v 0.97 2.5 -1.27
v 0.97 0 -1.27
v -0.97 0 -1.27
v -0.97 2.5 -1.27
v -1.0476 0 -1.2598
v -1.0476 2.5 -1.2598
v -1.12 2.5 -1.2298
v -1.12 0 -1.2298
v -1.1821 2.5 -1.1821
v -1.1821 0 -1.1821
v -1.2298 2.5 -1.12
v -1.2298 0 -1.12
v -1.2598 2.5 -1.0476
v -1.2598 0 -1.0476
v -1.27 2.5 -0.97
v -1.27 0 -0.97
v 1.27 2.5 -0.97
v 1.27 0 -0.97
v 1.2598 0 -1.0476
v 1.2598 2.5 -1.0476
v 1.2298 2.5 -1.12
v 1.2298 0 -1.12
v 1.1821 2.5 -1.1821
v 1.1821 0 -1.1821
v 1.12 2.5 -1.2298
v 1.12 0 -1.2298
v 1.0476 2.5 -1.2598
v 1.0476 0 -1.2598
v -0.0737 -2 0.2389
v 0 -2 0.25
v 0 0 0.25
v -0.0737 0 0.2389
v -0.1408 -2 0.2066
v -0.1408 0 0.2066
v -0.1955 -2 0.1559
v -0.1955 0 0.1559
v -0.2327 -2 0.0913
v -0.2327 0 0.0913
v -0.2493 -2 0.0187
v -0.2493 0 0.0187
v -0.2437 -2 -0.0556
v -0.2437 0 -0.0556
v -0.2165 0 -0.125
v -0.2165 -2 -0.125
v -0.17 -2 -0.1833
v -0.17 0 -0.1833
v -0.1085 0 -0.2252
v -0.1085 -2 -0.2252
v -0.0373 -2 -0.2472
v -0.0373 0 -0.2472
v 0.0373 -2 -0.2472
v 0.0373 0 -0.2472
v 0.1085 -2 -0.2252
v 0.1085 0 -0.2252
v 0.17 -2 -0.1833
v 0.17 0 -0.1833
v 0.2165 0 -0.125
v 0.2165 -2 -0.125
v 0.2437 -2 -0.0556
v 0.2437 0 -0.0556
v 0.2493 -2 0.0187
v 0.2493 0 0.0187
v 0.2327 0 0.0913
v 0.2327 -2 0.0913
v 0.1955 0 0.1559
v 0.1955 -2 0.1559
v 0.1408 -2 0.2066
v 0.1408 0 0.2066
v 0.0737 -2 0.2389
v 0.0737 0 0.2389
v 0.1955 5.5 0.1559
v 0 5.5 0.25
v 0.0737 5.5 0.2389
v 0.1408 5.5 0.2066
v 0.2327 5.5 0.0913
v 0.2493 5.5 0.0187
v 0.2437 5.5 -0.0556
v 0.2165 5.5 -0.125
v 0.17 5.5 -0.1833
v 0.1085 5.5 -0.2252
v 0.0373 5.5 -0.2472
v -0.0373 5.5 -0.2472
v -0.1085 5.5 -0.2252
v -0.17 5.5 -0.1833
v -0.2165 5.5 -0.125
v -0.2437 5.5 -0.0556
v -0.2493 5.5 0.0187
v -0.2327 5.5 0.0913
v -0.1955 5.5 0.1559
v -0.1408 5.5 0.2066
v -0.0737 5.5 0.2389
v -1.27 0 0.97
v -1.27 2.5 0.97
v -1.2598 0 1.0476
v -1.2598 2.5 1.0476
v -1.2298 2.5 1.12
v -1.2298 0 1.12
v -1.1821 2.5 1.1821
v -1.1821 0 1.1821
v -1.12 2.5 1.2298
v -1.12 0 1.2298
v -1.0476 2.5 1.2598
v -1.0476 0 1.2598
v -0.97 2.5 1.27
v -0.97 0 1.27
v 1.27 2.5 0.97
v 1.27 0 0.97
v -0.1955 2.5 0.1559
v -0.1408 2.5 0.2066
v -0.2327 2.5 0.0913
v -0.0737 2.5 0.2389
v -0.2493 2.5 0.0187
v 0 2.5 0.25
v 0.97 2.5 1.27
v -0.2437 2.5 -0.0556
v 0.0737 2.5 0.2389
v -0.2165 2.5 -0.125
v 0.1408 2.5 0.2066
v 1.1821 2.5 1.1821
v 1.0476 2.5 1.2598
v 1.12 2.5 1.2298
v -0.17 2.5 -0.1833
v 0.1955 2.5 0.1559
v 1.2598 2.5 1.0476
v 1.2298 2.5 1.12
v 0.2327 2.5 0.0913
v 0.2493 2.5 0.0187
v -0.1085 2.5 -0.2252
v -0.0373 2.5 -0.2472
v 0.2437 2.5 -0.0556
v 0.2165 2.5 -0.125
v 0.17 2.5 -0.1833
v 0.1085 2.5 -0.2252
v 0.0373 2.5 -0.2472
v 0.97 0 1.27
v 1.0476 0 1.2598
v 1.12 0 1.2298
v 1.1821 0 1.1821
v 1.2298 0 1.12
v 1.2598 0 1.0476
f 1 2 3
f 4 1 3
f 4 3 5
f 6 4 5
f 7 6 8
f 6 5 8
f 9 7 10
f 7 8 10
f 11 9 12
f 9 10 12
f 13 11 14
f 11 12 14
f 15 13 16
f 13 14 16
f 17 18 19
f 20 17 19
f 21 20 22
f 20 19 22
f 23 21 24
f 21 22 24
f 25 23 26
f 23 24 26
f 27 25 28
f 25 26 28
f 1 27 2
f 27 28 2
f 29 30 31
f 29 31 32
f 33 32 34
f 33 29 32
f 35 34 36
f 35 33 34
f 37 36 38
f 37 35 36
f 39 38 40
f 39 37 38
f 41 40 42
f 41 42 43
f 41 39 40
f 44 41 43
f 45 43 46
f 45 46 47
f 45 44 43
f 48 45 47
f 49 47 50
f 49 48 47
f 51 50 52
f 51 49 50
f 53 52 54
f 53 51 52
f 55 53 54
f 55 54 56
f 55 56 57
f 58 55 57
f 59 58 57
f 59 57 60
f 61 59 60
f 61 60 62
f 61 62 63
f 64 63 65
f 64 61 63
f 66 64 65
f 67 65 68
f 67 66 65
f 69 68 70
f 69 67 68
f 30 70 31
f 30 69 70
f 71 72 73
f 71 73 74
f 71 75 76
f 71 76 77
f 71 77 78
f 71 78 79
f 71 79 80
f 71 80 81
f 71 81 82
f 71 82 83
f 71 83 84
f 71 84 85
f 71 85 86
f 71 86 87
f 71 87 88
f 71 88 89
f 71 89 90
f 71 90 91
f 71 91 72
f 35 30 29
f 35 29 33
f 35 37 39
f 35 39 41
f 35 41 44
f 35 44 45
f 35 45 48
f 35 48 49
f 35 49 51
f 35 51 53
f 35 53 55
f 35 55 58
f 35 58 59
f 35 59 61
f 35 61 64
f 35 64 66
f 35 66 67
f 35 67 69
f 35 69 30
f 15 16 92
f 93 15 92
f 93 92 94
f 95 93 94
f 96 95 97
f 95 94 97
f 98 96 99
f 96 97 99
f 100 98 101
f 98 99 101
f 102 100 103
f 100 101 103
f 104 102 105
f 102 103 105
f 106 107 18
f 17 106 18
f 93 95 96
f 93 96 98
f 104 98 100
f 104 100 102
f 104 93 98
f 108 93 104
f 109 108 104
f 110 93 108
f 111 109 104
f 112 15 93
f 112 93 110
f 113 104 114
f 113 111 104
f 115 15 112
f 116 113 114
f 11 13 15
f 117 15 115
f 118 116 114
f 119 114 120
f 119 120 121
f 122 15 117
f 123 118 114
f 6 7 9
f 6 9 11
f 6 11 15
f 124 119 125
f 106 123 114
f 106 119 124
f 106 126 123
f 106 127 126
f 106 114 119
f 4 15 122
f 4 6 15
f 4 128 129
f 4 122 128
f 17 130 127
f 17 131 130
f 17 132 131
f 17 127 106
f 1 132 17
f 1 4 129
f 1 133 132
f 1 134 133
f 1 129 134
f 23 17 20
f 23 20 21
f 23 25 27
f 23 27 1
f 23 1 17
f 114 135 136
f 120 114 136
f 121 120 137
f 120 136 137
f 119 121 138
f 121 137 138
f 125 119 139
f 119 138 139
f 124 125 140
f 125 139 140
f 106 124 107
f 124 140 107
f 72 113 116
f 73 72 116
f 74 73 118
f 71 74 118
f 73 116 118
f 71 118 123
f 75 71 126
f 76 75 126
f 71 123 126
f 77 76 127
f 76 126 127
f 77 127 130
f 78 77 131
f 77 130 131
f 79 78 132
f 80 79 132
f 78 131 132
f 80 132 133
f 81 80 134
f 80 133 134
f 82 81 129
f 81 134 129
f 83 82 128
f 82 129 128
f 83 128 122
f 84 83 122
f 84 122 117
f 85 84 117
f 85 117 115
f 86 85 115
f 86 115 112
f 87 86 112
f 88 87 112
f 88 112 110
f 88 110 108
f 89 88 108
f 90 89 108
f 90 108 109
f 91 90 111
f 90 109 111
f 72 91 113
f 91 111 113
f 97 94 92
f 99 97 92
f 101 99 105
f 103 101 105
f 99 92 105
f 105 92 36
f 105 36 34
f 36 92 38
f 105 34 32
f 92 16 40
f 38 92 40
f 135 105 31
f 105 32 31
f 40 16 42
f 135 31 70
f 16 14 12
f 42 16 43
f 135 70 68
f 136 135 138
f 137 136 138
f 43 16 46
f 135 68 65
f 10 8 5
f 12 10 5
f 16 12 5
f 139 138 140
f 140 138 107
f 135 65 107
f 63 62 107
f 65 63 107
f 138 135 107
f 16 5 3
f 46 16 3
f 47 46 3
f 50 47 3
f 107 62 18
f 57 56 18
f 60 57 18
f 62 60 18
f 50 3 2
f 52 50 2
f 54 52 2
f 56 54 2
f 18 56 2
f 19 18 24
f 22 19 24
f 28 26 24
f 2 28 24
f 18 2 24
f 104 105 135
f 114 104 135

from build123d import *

# Parameters (mm, degrees)
BOSS_EXTRUDE1_DEPTH = 2.5
SKETCH2_R           = 0.25
BOSS_EXTRUDE2_DEPTH = 3
BOSS_EXTRUDE3_START = 2
SKETCH3_R           = 0.25
BOSS_EXTRUDE3_DEPTH = 2


with BuildPart() as part:
    # Sketch1 → Boss-Extrude1 (new body)
    with BuildSketch(Plane(origin=(0, 0, 0), x_dir=(1, 0, 0), z_dir=(0, 1, 0))):
        with BuildLine():
            Line((-0.97, -1.27), (0.97, -1.27))
            ThreePointArc((0.97, -1.27), (1.182132034, -1.182132034), (1.27, -0.97))
            Line((1.27, -0.97), (1.27, 0.97))
            ThreePointArc((1.27, 0.97), (1.182132034, 1.182132034), (0.97, 1.27))
            Line((0.97, 1.27), (-0.97, 1.27))
            ThreePointArc((-0.97, 1.27), (-1.182132034, 1.182132034), (-1.27, 0.97))
            Line((-1.27, 0.97), (-1.27, -0.97))
            ThreePointArc((-1.27, -0.97), (-1.182132034, -1.182132034), (-0.97, -1.27))
        make_face()
    extrude(amount=BOSS_EXTRUDE1_DEPTH)

    # Sketch2 → Boss-Extrude2 (add)
    with BuildSketch(Plane(origin=(0, 2.5, 0), x_dir=(1, 0, 0), z_dir=(0, 1, 0))):
        with Locations(Location((0, 0, 0), (0, 0, 270))):
            Circle(SKETCH2_R)
    extrude(amount=BOSS_EXTRUDE2_DEPTH)

    # Sketch3 → Boss-Extrude3 (add)
    with BuildSketch(Plane.XZ.offset(BOSS_EXTRUDE3_START)):
        with Locations(Location((0, 0, 0), (0, 0, 90))):
            Circle(SKETCH3_R)
    extrude(amount=-BOSS_EXTRUDE3_DEPTH)


solid = part.part
